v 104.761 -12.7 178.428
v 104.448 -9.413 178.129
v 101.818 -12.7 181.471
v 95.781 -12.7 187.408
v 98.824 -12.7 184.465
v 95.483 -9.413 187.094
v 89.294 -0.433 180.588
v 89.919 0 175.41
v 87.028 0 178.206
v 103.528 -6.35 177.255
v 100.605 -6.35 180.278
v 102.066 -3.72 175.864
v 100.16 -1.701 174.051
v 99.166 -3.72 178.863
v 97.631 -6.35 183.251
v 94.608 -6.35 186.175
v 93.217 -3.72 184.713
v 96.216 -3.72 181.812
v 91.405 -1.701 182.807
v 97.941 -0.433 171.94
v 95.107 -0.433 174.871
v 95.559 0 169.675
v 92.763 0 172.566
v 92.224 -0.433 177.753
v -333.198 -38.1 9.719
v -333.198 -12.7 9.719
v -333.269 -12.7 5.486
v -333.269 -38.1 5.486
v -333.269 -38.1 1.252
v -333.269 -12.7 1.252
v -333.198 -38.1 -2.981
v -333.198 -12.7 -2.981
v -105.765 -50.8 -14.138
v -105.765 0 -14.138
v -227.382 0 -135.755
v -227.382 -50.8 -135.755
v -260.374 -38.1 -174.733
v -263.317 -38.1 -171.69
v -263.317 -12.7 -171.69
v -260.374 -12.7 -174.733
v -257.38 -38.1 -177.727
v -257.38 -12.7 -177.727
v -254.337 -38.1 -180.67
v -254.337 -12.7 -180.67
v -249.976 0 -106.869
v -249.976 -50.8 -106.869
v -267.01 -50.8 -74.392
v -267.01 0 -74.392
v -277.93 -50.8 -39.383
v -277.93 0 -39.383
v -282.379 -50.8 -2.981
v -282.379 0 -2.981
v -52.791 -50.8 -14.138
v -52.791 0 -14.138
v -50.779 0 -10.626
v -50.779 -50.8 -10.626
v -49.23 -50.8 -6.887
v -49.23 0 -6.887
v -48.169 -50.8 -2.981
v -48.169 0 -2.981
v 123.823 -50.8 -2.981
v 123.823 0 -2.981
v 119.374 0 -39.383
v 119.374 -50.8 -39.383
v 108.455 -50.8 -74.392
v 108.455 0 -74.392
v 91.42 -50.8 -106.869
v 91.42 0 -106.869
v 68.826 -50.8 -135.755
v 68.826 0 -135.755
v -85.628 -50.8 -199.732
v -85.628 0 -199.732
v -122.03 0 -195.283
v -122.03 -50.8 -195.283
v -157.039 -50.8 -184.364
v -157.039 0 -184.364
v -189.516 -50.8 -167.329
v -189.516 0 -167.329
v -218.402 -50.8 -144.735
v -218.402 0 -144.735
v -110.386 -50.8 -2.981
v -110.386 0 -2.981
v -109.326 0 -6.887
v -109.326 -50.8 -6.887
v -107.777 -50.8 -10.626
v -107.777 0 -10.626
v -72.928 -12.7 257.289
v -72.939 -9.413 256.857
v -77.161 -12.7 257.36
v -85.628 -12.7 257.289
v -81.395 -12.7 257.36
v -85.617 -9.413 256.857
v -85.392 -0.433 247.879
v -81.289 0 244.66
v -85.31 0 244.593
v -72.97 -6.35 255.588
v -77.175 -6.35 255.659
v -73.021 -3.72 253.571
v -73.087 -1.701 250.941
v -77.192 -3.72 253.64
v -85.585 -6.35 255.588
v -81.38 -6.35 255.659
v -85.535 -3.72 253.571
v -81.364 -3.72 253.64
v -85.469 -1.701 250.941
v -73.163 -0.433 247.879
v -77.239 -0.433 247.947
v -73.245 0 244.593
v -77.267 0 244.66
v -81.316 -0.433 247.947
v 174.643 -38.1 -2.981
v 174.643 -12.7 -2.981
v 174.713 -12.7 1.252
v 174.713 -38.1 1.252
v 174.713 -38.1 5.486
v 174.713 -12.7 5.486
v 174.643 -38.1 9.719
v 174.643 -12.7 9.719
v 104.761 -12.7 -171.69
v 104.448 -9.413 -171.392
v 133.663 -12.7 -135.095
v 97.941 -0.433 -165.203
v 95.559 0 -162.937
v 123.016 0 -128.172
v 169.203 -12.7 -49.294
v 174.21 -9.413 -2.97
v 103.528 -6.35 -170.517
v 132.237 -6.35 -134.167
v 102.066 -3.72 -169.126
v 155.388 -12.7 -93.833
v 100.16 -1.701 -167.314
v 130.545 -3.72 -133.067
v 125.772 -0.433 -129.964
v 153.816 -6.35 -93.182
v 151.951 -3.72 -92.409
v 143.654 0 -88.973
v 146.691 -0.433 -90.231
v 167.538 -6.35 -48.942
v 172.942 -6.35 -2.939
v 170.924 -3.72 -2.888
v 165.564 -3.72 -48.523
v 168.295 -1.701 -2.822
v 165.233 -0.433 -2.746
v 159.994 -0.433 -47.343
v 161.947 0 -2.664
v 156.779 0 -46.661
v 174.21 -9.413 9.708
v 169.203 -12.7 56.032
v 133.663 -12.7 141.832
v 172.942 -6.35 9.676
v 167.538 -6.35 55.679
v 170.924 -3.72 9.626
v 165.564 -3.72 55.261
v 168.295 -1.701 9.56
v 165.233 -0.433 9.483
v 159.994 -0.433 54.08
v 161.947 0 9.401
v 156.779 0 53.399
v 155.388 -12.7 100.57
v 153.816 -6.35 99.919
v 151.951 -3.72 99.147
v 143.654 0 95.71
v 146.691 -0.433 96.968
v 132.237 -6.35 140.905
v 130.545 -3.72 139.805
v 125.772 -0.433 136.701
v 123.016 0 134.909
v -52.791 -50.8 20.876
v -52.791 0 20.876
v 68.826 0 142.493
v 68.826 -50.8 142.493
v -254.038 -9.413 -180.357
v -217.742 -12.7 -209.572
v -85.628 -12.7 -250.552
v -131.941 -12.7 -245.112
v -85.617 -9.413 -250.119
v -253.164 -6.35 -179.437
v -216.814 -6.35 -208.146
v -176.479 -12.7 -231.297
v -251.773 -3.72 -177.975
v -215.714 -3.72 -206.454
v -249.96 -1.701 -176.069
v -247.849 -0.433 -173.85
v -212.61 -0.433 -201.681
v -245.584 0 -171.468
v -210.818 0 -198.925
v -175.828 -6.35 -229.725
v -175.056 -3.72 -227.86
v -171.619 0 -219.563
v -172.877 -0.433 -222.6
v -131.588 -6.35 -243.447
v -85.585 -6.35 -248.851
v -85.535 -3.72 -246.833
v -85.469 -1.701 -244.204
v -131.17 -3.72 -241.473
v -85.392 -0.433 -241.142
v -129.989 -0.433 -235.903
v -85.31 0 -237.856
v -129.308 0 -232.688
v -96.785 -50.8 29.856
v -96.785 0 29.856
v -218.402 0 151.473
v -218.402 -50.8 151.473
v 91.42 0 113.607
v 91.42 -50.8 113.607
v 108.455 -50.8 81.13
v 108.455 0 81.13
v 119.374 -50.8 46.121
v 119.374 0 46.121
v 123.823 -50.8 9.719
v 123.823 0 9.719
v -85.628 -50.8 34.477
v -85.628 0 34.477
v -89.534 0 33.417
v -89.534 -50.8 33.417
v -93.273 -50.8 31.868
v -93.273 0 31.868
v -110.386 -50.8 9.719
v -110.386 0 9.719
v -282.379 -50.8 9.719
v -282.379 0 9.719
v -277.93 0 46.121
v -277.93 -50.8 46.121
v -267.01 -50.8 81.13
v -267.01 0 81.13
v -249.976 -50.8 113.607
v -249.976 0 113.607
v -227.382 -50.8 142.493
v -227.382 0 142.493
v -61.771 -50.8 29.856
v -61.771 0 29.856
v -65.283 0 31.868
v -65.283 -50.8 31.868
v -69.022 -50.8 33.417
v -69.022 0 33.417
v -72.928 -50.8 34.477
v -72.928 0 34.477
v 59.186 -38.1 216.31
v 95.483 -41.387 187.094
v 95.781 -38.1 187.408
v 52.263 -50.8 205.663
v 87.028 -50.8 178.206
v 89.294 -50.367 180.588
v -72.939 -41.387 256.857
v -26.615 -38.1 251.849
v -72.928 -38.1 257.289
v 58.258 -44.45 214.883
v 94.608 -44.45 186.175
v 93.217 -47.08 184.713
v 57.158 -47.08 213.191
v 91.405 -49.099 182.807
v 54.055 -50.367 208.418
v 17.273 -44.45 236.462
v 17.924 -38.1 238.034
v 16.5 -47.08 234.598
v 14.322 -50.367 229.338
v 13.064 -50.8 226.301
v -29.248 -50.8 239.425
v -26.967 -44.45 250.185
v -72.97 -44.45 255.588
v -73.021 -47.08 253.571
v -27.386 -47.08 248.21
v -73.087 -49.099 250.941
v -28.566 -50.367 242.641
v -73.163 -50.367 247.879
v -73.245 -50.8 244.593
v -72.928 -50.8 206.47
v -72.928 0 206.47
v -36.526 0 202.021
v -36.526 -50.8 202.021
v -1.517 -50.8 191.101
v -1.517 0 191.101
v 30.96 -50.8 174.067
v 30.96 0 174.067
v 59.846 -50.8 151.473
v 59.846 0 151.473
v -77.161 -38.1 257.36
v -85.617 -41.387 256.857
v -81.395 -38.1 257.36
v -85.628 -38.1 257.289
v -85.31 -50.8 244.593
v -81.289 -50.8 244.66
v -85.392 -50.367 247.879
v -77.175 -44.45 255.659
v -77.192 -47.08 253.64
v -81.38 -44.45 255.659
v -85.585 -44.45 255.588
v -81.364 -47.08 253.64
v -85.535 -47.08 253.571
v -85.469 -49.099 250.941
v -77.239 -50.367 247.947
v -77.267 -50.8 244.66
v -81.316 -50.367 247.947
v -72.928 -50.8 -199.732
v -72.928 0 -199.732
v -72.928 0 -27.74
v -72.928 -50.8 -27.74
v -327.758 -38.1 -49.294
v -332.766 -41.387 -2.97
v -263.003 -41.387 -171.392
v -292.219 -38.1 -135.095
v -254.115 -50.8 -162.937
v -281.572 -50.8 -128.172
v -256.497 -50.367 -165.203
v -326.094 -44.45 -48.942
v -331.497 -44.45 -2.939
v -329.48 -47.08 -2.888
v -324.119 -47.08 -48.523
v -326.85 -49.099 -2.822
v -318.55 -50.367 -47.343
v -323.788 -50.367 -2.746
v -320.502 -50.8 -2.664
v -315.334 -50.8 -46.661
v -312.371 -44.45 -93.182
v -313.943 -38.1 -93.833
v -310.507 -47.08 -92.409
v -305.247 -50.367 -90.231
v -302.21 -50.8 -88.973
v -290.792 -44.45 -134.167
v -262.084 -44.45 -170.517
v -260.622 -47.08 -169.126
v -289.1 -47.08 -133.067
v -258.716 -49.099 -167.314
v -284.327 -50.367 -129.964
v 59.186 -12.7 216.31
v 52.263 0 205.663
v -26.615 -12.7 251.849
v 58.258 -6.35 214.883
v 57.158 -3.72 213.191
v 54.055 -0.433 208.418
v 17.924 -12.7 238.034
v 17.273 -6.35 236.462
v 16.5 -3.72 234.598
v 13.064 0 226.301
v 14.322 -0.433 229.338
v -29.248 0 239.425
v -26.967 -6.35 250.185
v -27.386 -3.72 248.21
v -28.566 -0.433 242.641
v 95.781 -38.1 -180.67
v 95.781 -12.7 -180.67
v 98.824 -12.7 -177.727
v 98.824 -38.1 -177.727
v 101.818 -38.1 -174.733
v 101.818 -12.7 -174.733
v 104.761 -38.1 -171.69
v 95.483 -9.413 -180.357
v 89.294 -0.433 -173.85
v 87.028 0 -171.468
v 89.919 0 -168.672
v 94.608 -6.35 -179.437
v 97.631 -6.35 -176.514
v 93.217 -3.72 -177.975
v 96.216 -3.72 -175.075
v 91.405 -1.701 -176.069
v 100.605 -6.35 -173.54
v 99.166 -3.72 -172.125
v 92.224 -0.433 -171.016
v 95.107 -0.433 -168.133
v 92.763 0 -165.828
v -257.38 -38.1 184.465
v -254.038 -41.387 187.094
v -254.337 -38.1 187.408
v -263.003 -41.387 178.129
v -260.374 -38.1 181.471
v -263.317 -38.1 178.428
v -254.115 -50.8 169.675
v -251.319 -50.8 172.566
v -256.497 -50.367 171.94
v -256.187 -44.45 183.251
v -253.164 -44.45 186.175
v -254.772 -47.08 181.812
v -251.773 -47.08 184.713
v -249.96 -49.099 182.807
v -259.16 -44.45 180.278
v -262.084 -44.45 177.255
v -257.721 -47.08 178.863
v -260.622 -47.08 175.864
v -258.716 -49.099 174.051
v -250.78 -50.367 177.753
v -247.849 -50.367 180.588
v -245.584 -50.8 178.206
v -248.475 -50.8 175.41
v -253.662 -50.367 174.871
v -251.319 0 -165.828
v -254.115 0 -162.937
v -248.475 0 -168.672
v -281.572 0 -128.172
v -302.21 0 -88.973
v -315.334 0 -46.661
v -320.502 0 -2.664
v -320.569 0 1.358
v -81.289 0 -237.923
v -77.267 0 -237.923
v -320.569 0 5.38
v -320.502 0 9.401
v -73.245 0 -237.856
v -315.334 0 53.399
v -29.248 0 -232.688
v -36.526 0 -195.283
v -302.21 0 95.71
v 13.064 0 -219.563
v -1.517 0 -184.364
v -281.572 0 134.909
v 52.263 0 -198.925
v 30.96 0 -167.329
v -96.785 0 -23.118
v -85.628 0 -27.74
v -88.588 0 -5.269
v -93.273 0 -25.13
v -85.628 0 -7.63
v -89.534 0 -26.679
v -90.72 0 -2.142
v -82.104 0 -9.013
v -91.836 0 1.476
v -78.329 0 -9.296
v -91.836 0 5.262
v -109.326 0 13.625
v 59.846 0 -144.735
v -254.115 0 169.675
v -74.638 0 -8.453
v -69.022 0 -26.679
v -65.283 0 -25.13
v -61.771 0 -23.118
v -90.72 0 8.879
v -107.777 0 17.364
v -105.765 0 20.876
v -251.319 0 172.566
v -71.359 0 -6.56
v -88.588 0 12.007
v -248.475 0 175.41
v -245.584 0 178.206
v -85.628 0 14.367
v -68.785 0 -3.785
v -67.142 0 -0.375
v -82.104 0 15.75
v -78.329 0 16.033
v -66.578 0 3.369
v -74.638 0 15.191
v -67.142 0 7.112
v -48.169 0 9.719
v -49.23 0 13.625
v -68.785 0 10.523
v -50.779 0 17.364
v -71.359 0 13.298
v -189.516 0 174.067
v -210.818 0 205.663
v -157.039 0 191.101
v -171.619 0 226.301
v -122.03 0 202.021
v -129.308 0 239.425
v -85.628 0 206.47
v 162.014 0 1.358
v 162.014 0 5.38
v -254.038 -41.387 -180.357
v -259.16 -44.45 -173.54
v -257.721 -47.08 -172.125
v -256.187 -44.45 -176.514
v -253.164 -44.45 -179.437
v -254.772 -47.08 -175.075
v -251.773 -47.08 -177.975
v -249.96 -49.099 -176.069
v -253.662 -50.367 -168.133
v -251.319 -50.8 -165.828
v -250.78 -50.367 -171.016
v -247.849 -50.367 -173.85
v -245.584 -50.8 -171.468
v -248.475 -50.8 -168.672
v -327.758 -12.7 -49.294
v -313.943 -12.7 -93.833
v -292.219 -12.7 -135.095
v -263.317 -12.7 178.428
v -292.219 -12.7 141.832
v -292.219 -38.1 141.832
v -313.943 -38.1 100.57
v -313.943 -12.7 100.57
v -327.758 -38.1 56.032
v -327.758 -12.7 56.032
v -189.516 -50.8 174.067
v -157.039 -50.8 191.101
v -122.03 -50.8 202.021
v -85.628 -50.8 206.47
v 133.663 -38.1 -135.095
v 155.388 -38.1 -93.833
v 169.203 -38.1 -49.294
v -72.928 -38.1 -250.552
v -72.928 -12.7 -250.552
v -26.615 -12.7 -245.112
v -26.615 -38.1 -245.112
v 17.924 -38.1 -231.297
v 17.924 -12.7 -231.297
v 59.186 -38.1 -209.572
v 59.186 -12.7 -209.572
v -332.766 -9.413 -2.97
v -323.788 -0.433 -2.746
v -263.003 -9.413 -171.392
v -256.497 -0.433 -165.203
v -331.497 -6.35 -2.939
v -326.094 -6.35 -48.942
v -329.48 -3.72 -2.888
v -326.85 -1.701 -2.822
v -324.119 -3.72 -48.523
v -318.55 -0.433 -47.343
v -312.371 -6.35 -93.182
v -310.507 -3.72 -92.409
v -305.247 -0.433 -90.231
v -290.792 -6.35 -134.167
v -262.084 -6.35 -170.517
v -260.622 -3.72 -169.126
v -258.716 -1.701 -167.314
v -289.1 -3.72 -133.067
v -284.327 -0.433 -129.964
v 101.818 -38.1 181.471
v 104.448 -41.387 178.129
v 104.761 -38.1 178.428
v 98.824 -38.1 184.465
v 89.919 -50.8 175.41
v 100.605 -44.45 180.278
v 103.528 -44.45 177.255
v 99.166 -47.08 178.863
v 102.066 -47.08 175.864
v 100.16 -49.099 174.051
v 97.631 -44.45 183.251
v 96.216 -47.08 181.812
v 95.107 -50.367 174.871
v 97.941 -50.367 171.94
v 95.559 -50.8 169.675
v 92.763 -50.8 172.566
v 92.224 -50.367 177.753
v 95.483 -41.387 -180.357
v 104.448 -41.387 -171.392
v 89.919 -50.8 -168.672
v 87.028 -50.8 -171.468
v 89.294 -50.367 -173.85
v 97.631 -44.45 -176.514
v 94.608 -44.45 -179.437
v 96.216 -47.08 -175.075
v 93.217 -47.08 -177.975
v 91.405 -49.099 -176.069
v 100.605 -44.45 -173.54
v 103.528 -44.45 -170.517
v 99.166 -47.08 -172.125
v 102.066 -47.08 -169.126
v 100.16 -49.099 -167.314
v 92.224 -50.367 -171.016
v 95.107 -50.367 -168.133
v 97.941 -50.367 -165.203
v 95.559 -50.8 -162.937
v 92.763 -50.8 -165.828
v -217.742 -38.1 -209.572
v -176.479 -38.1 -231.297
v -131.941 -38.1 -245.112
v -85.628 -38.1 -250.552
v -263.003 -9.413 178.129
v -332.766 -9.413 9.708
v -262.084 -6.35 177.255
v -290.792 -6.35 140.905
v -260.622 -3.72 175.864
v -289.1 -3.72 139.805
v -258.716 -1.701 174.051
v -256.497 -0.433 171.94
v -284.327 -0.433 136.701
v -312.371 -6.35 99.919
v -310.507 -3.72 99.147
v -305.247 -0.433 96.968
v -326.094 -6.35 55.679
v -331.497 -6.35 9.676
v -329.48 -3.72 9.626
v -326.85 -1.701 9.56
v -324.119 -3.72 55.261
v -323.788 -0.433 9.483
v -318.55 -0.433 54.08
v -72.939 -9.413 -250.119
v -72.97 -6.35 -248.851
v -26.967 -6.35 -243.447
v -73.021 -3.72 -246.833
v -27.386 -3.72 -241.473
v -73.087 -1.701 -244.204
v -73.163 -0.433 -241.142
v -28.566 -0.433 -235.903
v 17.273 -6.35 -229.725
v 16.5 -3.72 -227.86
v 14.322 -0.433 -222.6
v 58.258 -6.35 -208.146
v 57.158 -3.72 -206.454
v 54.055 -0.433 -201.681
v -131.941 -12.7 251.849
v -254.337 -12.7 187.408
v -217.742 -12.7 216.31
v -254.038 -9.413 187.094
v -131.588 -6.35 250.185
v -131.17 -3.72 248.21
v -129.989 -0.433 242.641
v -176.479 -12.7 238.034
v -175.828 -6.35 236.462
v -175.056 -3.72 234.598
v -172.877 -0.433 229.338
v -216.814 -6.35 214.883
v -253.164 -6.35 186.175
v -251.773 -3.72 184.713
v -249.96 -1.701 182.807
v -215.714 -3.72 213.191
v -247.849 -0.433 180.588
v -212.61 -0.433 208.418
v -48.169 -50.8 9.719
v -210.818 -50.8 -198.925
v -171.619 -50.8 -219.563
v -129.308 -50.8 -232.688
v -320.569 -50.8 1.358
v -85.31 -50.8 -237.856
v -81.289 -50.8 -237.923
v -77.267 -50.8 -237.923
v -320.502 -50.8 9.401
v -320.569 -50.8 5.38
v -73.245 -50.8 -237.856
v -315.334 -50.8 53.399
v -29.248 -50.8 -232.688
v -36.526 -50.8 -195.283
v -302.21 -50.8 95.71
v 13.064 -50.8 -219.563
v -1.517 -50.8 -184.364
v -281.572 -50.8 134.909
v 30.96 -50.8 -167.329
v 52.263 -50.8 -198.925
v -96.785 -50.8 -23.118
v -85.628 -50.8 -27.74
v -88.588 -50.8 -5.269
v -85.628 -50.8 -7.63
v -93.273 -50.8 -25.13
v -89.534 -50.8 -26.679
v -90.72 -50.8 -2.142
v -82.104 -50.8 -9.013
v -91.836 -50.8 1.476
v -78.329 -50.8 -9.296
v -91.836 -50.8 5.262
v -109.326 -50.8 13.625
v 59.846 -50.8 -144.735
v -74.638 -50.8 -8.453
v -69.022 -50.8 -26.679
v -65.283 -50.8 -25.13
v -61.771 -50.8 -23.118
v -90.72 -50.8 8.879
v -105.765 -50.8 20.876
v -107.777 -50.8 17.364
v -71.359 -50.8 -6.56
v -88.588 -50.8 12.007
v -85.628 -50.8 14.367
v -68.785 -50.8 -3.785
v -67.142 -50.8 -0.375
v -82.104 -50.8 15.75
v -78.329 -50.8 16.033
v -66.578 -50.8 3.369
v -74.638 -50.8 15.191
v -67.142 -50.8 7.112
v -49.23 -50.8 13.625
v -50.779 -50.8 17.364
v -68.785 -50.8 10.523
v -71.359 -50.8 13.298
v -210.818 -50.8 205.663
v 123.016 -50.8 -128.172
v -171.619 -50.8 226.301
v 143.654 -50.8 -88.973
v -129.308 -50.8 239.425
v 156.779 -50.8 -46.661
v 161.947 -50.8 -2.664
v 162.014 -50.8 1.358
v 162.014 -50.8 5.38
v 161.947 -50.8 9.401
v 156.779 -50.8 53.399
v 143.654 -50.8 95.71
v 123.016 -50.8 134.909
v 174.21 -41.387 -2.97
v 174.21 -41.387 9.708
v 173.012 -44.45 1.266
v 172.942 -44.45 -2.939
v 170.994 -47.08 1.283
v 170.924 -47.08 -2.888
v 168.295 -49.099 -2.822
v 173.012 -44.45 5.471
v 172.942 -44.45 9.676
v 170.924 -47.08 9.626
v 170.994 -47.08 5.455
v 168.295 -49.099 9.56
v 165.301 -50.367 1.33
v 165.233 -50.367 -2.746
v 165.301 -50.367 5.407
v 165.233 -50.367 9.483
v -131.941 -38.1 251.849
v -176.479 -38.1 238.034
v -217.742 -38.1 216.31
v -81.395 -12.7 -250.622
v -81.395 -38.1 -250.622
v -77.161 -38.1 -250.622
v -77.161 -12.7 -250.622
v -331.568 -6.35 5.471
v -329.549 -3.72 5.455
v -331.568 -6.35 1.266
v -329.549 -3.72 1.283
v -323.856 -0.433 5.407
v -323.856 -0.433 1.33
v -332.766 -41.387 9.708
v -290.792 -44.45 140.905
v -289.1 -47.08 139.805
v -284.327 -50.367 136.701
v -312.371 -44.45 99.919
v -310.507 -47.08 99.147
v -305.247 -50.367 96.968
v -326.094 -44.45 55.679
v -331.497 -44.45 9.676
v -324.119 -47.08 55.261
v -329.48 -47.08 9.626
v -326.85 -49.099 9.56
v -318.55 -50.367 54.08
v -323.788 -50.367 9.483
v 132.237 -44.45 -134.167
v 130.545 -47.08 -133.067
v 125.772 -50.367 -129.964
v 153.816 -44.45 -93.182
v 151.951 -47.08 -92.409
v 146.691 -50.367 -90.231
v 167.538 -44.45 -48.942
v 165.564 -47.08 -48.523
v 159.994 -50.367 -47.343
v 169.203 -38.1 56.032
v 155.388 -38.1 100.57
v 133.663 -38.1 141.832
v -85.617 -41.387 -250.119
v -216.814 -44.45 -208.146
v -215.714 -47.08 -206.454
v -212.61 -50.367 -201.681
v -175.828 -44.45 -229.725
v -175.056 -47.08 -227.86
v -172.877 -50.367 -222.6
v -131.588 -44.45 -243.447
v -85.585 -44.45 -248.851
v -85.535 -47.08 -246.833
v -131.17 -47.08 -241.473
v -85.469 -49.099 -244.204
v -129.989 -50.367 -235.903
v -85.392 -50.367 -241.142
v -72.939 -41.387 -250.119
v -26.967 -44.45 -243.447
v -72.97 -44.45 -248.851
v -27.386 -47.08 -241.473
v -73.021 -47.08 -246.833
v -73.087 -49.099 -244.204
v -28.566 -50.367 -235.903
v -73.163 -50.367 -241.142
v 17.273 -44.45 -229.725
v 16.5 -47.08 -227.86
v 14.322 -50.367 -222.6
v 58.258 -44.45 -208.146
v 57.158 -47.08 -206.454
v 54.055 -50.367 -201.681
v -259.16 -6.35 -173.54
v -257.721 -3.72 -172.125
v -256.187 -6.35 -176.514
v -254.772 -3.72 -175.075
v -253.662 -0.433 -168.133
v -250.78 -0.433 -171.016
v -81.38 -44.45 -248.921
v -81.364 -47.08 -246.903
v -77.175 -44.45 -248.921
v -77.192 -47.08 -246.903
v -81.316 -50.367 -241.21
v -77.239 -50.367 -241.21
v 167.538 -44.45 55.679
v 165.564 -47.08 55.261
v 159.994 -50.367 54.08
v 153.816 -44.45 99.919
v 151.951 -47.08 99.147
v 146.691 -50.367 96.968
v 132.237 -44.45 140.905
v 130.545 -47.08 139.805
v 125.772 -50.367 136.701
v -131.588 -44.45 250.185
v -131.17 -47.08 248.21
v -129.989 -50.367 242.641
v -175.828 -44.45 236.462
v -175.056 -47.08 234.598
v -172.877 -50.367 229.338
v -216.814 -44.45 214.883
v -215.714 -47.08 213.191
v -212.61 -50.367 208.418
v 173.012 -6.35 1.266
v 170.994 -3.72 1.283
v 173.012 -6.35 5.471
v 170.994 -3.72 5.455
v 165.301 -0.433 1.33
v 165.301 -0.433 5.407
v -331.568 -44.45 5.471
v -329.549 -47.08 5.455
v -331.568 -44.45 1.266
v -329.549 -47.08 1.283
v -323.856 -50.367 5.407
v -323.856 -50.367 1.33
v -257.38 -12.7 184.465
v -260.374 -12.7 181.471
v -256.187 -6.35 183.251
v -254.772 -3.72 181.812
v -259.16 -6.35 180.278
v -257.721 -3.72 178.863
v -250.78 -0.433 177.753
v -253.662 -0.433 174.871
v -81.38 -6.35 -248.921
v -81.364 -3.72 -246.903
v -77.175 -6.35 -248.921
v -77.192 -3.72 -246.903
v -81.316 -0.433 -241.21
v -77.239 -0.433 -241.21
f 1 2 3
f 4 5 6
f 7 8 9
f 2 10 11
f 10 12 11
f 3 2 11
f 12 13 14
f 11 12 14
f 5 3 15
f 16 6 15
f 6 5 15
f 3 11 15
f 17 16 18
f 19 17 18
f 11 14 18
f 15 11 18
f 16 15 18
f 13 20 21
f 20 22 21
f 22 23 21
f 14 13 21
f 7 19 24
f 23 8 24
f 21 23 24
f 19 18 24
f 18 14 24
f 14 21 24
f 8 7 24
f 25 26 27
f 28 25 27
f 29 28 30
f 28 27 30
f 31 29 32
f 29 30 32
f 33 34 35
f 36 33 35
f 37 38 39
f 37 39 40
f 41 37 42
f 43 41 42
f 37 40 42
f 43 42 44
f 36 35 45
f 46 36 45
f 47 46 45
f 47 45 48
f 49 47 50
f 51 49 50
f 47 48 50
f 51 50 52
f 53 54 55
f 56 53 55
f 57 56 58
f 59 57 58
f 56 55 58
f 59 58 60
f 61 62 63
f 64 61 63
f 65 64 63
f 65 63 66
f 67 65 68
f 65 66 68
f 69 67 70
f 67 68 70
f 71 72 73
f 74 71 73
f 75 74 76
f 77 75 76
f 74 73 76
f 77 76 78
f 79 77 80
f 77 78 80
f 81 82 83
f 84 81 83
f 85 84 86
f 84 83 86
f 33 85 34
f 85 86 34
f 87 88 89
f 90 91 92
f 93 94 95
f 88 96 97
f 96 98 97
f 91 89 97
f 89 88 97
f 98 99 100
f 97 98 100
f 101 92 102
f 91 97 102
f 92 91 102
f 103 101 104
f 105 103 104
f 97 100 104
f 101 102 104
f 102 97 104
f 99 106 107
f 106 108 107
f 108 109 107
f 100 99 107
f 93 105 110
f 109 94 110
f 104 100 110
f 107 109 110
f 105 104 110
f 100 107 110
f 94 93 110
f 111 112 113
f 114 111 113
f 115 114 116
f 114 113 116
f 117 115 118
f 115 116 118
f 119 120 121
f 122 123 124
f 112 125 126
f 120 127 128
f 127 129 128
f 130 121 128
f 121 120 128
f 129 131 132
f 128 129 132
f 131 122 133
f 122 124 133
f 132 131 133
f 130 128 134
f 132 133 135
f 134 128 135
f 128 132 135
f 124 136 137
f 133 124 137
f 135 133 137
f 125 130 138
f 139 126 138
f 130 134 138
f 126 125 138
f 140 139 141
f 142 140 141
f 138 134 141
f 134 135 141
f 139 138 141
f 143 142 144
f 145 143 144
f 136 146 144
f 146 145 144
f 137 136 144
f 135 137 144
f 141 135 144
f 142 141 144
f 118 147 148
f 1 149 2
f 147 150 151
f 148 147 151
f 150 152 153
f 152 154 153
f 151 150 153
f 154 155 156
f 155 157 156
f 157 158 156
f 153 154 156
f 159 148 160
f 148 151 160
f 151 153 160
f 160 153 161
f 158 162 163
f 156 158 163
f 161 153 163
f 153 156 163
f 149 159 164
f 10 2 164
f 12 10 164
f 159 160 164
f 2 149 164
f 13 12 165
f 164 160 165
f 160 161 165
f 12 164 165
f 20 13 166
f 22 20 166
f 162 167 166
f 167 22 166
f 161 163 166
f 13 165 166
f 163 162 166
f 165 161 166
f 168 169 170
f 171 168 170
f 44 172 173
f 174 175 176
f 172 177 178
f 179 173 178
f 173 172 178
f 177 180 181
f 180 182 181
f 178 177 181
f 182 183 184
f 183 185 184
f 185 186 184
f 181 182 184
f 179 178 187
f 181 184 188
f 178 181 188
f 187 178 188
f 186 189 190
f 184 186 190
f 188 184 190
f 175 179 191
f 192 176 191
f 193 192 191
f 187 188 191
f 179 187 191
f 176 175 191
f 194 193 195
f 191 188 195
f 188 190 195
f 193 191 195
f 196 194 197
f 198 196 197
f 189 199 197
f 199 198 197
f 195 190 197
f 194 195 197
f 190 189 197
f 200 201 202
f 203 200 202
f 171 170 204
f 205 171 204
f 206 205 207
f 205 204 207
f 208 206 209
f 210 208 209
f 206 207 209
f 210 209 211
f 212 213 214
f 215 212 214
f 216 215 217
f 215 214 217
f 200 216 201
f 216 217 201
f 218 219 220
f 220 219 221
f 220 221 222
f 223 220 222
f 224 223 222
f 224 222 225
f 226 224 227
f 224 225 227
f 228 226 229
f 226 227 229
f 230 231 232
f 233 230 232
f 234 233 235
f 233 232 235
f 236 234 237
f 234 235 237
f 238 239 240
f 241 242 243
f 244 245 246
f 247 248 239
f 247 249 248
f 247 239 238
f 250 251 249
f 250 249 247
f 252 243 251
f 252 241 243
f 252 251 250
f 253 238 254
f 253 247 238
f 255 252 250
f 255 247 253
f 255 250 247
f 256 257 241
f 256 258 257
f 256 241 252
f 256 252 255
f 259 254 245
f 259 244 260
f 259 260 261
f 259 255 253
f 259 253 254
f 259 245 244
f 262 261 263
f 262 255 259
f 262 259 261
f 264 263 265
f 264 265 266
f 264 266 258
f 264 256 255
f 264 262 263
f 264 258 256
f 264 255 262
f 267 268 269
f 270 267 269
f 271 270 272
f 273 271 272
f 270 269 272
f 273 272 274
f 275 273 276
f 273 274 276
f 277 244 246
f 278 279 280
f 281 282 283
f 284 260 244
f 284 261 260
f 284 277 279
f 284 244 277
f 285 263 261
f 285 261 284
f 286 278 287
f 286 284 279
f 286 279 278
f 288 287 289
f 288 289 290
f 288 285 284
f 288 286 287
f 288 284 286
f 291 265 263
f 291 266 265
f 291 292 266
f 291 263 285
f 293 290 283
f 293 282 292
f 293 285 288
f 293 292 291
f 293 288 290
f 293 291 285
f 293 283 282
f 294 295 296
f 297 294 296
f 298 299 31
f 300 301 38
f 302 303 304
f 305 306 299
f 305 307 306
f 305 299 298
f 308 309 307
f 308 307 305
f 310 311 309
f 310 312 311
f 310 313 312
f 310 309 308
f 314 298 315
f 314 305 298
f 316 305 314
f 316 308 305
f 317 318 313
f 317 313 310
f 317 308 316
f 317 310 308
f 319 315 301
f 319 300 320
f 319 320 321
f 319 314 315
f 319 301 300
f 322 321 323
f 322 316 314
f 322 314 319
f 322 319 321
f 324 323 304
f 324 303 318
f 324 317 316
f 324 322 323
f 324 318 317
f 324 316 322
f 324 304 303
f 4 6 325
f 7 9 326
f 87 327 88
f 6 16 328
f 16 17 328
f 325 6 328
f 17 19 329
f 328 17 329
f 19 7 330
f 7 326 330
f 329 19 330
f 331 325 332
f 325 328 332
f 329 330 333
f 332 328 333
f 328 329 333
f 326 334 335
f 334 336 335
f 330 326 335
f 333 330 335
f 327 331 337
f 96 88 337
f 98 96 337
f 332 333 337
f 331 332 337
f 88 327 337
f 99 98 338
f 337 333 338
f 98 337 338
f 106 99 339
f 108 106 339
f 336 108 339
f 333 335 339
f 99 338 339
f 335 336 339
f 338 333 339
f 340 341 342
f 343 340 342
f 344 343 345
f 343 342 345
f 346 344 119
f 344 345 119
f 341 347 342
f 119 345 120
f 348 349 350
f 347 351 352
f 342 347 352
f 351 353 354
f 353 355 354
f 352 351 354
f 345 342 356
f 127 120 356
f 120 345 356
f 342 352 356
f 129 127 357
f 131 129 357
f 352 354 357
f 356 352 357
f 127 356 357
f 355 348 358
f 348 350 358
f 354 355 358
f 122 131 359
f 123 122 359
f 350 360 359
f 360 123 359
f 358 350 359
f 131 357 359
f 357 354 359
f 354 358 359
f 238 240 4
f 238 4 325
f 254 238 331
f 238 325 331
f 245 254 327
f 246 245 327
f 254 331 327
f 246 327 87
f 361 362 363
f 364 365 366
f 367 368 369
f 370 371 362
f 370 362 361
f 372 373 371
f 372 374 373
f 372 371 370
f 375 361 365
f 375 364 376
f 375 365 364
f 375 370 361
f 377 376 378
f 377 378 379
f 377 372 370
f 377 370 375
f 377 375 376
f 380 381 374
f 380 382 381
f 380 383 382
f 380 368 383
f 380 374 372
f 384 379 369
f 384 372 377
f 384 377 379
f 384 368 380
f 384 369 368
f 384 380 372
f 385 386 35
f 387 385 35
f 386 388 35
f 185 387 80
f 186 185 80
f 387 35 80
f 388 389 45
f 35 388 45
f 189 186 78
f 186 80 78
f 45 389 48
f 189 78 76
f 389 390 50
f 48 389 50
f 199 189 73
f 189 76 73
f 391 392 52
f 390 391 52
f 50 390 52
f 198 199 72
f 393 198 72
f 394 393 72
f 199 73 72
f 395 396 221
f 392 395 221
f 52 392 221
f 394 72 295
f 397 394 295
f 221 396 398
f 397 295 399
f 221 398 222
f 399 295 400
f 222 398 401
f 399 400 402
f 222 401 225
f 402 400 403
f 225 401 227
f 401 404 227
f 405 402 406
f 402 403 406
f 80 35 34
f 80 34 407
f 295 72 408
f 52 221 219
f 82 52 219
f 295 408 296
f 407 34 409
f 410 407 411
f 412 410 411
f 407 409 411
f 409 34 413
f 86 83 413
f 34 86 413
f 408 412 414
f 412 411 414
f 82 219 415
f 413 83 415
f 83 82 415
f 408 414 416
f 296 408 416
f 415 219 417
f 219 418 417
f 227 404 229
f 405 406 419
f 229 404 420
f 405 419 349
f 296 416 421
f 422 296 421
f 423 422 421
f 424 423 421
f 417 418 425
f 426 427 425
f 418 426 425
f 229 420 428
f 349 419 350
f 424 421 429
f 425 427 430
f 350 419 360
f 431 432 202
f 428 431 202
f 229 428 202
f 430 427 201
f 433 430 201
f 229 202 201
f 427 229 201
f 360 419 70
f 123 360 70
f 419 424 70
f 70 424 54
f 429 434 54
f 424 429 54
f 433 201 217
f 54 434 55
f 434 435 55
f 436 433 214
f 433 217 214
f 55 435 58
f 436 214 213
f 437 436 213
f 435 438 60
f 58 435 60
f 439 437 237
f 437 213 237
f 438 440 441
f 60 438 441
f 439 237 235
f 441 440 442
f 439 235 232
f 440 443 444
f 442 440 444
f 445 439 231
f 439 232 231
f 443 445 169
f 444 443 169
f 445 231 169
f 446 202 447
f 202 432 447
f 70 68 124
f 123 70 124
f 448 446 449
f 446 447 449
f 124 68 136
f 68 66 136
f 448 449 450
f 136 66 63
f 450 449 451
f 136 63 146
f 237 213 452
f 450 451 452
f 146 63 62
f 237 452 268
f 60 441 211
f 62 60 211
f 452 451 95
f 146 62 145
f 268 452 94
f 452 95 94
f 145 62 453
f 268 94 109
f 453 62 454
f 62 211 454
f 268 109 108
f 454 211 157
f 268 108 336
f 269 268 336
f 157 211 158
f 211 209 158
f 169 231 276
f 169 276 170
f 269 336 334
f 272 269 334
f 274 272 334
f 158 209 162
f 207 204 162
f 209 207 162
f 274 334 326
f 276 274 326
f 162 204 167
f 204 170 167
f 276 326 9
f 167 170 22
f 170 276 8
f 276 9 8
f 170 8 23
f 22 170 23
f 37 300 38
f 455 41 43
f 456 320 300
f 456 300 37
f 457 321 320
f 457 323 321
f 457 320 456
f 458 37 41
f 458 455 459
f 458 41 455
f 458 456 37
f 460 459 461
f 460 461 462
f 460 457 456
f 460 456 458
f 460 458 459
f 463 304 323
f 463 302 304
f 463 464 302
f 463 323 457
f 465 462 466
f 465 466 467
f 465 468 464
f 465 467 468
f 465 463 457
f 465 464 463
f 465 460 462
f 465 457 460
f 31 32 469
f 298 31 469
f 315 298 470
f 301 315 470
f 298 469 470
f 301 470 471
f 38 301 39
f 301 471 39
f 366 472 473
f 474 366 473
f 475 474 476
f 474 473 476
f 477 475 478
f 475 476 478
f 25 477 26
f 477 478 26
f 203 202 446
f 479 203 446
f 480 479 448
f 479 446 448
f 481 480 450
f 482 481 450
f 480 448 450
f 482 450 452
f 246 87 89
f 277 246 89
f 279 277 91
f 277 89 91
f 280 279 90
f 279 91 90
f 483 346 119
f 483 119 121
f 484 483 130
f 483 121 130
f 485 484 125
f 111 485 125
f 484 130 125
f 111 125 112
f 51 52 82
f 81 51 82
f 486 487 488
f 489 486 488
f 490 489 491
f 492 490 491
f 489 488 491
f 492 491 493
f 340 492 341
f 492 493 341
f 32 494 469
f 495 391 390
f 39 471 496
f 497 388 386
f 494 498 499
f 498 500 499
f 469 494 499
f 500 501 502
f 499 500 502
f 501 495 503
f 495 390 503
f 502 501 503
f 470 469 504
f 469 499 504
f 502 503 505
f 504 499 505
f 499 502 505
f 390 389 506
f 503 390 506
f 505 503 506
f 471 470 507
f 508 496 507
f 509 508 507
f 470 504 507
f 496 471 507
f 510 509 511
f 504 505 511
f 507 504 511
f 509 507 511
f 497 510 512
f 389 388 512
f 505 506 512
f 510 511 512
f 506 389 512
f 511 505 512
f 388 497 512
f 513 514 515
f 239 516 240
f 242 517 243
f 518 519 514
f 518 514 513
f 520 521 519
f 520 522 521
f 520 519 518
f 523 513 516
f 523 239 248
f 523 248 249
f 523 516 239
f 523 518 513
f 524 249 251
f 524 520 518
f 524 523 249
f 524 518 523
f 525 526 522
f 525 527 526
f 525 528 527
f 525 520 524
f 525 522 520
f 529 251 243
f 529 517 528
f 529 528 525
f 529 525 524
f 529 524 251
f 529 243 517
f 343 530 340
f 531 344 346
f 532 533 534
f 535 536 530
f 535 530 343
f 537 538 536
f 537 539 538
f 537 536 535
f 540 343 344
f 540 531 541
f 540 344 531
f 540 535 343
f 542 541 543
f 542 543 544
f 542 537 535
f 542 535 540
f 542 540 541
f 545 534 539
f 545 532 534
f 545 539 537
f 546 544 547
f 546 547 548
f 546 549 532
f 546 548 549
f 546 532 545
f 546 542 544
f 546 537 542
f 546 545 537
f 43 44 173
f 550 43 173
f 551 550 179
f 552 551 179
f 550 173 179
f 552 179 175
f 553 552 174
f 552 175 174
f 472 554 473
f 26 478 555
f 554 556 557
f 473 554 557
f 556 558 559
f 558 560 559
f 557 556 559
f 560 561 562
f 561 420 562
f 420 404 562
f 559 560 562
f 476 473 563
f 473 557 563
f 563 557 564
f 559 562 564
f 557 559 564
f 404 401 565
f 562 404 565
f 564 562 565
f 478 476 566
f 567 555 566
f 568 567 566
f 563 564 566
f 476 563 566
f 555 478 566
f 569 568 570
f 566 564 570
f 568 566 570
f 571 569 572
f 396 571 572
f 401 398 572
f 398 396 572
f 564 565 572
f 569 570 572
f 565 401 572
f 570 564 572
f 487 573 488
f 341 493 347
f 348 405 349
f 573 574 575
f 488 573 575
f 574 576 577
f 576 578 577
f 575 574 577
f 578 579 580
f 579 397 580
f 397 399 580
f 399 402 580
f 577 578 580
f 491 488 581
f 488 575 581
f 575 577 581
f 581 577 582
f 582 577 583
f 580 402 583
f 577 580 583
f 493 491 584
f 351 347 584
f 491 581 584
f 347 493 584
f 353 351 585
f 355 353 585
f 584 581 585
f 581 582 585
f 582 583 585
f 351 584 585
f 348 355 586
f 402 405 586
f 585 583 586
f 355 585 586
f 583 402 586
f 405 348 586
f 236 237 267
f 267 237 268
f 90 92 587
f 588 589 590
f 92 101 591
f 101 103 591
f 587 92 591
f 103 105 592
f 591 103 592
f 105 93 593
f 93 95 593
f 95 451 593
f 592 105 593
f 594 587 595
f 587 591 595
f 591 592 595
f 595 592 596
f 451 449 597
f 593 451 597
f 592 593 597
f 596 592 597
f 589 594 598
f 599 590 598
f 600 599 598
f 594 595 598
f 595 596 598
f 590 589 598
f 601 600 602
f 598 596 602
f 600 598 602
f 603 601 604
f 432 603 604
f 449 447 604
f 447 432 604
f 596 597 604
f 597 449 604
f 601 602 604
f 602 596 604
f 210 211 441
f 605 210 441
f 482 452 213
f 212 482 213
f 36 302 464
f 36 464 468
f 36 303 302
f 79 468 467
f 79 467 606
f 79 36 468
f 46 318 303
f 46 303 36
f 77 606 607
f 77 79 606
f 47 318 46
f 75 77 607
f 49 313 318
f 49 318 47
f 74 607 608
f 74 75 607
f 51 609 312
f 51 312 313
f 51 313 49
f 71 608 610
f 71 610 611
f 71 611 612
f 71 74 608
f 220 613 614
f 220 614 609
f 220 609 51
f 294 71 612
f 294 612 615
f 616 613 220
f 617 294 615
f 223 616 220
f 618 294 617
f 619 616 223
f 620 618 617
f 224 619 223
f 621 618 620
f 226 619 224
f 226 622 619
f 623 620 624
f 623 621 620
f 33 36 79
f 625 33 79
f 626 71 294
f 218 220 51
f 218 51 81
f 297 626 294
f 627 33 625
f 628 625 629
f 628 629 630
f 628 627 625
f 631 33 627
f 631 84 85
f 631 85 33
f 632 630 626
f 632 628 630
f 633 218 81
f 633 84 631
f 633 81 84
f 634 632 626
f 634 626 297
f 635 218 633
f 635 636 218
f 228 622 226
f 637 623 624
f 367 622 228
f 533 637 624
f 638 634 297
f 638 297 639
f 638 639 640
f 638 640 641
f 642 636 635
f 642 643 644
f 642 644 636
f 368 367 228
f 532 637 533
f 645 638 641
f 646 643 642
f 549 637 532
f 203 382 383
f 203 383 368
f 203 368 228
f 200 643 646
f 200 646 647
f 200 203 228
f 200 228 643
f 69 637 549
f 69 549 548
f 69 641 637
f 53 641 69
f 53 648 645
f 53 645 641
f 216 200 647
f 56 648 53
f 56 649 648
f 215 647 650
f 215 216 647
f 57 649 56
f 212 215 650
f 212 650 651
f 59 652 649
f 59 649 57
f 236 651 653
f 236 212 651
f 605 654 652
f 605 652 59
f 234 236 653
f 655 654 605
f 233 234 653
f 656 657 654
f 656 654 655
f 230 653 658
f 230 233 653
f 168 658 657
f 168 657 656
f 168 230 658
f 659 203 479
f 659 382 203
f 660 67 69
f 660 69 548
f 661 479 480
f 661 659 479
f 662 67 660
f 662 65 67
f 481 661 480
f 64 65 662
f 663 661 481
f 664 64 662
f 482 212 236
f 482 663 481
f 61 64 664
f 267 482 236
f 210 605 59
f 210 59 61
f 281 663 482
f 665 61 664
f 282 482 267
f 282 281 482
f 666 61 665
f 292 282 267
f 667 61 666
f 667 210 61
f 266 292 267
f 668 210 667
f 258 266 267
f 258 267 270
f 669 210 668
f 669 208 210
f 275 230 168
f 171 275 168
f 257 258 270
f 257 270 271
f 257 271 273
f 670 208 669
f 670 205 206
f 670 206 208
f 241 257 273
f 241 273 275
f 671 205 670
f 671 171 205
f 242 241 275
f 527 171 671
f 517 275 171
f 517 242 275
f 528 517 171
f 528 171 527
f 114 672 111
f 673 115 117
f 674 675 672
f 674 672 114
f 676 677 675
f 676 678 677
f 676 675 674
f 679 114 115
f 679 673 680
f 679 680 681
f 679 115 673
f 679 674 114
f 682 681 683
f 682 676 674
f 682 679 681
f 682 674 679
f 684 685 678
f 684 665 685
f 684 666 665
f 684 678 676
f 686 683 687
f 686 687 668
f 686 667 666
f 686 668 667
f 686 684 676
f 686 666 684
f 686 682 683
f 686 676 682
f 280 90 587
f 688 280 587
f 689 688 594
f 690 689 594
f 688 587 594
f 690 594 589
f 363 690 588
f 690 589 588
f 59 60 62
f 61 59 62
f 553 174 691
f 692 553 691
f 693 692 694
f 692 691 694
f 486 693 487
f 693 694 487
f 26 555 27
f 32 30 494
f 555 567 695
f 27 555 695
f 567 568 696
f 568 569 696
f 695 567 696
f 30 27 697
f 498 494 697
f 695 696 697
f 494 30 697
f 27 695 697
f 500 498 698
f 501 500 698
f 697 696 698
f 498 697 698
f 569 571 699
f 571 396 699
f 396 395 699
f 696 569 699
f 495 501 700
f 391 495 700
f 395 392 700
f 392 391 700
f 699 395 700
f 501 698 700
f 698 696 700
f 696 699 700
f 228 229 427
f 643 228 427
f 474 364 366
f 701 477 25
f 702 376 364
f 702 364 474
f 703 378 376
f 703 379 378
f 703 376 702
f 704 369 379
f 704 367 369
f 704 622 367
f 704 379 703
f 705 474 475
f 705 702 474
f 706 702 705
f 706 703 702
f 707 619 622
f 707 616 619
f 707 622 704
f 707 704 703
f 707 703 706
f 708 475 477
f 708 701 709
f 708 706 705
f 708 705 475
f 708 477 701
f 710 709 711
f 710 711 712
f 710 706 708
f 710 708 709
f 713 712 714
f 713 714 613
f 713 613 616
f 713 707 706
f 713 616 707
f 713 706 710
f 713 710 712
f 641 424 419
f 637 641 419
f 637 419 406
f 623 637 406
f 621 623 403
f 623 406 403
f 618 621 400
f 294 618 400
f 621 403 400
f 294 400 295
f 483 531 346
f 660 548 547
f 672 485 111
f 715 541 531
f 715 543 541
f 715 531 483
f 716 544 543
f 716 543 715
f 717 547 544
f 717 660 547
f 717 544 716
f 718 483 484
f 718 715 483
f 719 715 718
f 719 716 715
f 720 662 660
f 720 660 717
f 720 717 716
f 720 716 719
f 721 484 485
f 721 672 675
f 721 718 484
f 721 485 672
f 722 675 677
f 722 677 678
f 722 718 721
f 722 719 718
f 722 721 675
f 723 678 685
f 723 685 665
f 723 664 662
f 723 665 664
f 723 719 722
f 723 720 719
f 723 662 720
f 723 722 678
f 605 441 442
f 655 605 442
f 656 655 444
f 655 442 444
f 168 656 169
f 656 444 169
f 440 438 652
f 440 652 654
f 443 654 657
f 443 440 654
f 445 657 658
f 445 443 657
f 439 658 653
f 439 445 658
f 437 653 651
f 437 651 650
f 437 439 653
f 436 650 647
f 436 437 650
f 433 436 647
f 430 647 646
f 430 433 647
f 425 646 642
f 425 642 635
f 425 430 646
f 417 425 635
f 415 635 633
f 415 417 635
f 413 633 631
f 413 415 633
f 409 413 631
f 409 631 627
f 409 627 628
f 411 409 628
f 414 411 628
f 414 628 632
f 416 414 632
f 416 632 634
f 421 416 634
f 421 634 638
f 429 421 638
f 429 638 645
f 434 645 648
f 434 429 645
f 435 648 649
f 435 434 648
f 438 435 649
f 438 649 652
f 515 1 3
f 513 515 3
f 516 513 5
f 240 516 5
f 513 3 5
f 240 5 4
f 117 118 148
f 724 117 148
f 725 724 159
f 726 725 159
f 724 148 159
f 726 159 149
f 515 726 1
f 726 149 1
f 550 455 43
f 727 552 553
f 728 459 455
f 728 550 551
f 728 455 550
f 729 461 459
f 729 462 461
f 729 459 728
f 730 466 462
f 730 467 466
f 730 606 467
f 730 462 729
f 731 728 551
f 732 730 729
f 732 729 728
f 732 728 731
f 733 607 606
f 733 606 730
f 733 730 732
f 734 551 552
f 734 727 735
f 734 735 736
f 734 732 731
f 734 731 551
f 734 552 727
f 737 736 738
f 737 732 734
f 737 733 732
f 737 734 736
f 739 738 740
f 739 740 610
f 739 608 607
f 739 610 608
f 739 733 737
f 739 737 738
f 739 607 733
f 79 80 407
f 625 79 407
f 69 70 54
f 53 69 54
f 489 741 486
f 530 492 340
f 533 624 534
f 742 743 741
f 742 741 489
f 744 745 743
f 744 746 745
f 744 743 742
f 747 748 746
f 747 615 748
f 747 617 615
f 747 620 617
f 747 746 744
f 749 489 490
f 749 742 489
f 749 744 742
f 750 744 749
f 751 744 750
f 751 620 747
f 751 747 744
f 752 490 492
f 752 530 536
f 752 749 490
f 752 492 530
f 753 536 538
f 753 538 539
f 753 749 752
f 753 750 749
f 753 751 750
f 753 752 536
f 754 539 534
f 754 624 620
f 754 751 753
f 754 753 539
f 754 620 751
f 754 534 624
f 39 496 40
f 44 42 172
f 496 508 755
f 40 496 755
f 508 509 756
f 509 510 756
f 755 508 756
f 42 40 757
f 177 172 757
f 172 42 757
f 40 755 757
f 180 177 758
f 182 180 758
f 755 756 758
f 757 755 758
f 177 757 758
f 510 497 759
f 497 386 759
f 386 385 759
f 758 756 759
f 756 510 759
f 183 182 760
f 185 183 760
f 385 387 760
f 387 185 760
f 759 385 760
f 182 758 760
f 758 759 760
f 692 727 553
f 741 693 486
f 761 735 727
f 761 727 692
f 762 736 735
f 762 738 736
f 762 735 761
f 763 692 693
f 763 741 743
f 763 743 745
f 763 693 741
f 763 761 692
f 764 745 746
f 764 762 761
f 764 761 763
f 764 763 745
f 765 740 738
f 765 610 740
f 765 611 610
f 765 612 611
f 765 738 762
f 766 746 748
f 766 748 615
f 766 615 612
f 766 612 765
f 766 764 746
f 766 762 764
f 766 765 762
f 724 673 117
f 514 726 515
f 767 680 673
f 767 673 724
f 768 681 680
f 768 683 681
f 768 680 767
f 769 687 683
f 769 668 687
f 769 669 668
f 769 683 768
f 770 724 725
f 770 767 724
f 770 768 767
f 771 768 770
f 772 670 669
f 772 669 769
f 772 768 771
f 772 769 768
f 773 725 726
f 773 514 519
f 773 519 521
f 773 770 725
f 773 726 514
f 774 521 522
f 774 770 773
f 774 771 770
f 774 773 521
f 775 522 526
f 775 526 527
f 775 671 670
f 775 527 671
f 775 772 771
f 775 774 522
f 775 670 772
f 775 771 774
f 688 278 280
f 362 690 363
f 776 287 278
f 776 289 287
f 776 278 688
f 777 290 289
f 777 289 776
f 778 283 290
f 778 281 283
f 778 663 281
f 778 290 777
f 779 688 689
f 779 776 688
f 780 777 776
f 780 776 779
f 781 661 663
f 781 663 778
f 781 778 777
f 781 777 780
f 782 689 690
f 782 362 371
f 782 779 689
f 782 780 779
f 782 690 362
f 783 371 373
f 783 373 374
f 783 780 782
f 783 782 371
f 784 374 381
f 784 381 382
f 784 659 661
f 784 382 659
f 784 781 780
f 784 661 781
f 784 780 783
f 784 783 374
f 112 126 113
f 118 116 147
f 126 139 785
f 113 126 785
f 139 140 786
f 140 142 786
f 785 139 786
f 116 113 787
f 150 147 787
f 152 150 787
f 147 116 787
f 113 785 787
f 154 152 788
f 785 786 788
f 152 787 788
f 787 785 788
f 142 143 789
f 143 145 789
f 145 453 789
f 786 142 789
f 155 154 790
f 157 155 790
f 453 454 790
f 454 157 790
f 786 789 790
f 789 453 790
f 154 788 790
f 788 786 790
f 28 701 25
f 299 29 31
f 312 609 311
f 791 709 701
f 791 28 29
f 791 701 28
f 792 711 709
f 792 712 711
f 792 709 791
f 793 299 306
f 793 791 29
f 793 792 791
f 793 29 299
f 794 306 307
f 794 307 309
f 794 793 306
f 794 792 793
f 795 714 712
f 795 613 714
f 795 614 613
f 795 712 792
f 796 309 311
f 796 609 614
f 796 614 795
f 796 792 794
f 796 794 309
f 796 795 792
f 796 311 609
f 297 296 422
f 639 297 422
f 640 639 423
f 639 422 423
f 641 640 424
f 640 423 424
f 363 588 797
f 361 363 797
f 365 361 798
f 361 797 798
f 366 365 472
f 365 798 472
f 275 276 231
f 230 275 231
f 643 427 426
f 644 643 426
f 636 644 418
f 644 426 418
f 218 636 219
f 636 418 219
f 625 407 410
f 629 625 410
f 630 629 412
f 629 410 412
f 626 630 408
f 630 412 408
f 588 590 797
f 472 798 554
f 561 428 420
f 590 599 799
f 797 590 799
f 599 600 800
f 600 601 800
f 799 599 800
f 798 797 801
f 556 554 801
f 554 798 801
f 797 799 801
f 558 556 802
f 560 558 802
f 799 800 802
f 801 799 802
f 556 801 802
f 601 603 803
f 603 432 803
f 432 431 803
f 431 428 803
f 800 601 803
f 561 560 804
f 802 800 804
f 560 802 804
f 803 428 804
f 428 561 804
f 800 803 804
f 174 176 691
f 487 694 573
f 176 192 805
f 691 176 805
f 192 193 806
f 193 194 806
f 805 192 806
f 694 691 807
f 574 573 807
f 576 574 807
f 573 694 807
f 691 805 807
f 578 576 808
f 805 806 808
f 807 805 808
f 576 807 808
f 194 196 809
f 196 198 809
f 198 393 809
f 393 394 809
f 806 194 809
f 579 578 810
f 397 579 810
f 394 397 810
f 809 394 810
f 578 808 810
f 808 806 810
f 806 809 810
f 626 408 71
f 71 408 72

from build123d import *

# Parameters (mm, degrees)
F0_R     = 12.7
F1_DEPTH = 50.8
F2_R     = 12.7


with BuildPart() as f1:
    # F0 (on Front) → F1 (new body)
    with BuildSketch(Plane.XZ):
        with BuildLine():
            ThreePointArc((174.6427991592, -2.9811911121), (174.7023389384, 0.1935607732), (174.7221865654, 3.3688088879))
            ThreePointArc((174.7221865654, 3.3688088879), (174.7023389185, 6.5440585944), (174.6427990796, 9.7188120708))
            ThreePointArc((174.6427990796, 9.7188120708), (155.3875872141, 100.5704021794), (104.761301674, 178.4276678755))
            ThreePointArc((104.761301674, 178.4276678755), (100.3273078611, 182.973932435), (95.781043246, 187.4079261909))
            ThreePointArc((95.781043246, 187.4079261909), (17.9237769154, 238.034210755), (-72.9278134346, 257.2894214817))
            ThreePointArc((-72.9278134346, 257.2894214817), (-79.2778150265, 257.3688088879), (-85.6278166175, 257.2894214021))
            ThreePointArc((-85.6278166175, 257.2894214021), (-176.4794067261, 238.0342095366), (-254.3366724222, 187.4079239965))
            ThreePointArc((-254.3366724222, 187.4079239965), (-258.8829369817, 182.9739301836), (-263.3169307376, 178.4276655685))
            ThreePointArc((-263.3169307376, 178.4276655685), (-313.9432153017, 100.5703992379), (-333.1984260284, 9.7188088879))
            ThreePointArc((-333.1984260284, 9.7188088879), (-333.2778134346, 3.368807296), (-333.1984259488, -2.981194295))
            ThreePointArc((-333.1984259488, -2.981194295), (-313.9432140833, -93.8327844036), (-263.3169285432, -171.6900500997))
            ThreePointArc((-263.3169285432, -171.6900500997), (-258.8829347303, -176.2363146592), (-254.3366701152, -180.6703084151))
            ThreePointArc((-254.3366701152, -180.6703084151), (-176.4794037846, -231.2965929792), (-85.6278134346, -250.5518037059))
            ThreePointArc((-85.6278134346, -250.5518037059), (-79.2778118427, -250.6311911121), (-72.9278102517, -250.5518036263))
            ThreePointArc((-72.9278102517, -250.5518036263), (17.9237798569, -231.2965917608), (95.781045553, -180.6703062207))
            ThreePointArc((95.781045553, -180.6703062207), (100.3273101125, -176.2363124078), (104.7613038684, -171.6900477927))
            ThreePointArc((104.7613038684, -171.6900477927), (155.3875884325, -93.8327814621), (174.6427991592, -2.9811911121))
        make_face()
        with BuildLine():
            Line((-218.4016056024, -144.7352439022), (-96.7847279201, -23.11836622))
            ThreePointArc((-96.7847279201, -23.11836622), (-91.4280109116, -25.9643668909), (-85.6278134346, -27.7397108454))
            Line((-85.6278134346, -27.7397108454), (-85.6278134346, -199.7319481269))
            ThreePointArc((-85.6278134346, -199.7319481269), (-157.0390854202, -184.3635127277), (-218.4016056024, -144.7352439022))
        make_face(mode=Mode.SUBTRACT)
        with BuildLine():
            ThreePointArc((-227.3818640444, -135.7549856009), (-267.0101338316, -74.3924660397), (-282.3785703499, -2.981194295))
            Line((-282.3785703499, -2.981194295), (-110.3863325182, -2.981194295))
            ThreePointArc((-110.3863325182, -2.981194295), (-108.6109879703, -8.7813915903), (-105.7649867513, -14.1381083077))
            Line((-105.7649867513, -14.1381083077), (-227.3818640444, -135.7549856009))
        make_face(mode=Mode.SUBTRACT)
        with BuildLine():
            Line((-72.9278102517, -199.7319480274), (-72.9278102517, -27.7397101957))
            ThreePointArc((-72.9278102517, -27.7397101957), (-67.1276129564, -25.9643656478), (-61.770896239, -23.1183644288))
            Line((-61.770896239, -23.1183644288), (59.8459810542, -144.7352417219))
            ThreePointArc((59.8459810542, -144.7352417219), (-1.516538507, -184.3635115091), (-72.9278102517, -199.7319480274))
        make_face(mode=Mode.SUBTRACT)
        with BuildLine():
            Line((68.8262393555, -135.7549832799), (-52.7906383267, -14.1381055976))
            ThreePointArc((-52.7906383267, -14.1381055976), (-49.9446376558, -8.7813885891), (-48.1692937013, -2.9811911121))
            Line((-48.1692937013, -2.9811911121), (123.8229435802, -2.9811911121))
            ThreePointArc((123.8229435802, -2.9811911121), (108.454508181, -74.3924630977), (68.8262393555, -135.7549832799))
        make_face(mode=Mode.SUBTRACT)
        with BuildLine():
            Line((-227.3818662247, 142.4926010557), (-105.7649885425, 20.8757233734))
            ThreePointArc((-105.7649885425, 20.8757233734), (-108.6109892134, 15.5190063649), (-110.3863331679, 9.7188088879))
            Line((-110.3863331679, 9.7188088879), (-282.3785704494, 9.7188088879))
            ThreePointArc((-282.3785704494, 9.7188088879), (-267.0101350502, 81.1300808735), (-227.3818662247, 142.4926010557))
        make_face(mode=Mode.SUBTRACT)
        with BuildLine():
            Line((-85.6278166175, 206.4695658032), (-85.6278166175, 34.4773279715))
            ThreePointArc((-85.6278166175, 34.4773279715), (-91.4280139128, 32.7019834236), (-96.7847306302, 29.8559822046))
            Line((-96.7847306302, 29.8559822046), (-218.4016079234, 151.4728594977))
            ThreePointArc((-218.4016079234, 151.4728594977), (-157.0390883622, 191.1011292849), (-85.6278166175, 206.4695658032))
        make_face(mode=Mode.SUBTRACT)
        with Locations((-79.2778134346, 3.3688088879)):
            Circle(F0_R, mode=Mode.SUBTRACT)
        with BuildLine():
            Line((123.8229434807, 9.7188120708), (-48.169294351, 9.7188120708))
            ThreePointArc((-48.169294351, 9.7188120708), (-49.9446388989, 15.5190093661), (-52.7906401179, 20.8757260835))
            Line((-52.7906401179, 20.8757260835), (68.8262371752, 142.4926033767))
            ThreePointArc((68.8262371752, 142.4926033767), (108.4545069624, 81.1300838155), (123.8229434807, 9.7188120708))
        make_face(mode=Mode.SUBTRACT)
        with BuildLine():
            ThreePointArc((-61.7708989491, 29.8559839958), (-67.1276159576, 32.7019846667), (-72.9278134346, 34.4773286212))
            Line((-72.9278134346, 34.4773286212), (-72.9278134346, 206.4695659027))
            ThreePointArc((-72.9278134346, 206.4695659027), (-1.516541449, 191.1011305035), (59.8459787332, 151.472861678))
            Line((59.8459787332, 151.472861678), (-61.7708989491, 29.8559839958))
        make_face(mode=Mode.SUBTRACT)
    extrude(amount=F1_DEPTH)

    # F2
    f2_edges = [f1.edges().sort_by_distance(p)[0] for p in [
        (-254.33667, -50.8, -180.670308),
        (-254.33667, 0, -180.670308),
    ]]
    fillet(f2_edges, radius=F2_R)


solid = f1.part
